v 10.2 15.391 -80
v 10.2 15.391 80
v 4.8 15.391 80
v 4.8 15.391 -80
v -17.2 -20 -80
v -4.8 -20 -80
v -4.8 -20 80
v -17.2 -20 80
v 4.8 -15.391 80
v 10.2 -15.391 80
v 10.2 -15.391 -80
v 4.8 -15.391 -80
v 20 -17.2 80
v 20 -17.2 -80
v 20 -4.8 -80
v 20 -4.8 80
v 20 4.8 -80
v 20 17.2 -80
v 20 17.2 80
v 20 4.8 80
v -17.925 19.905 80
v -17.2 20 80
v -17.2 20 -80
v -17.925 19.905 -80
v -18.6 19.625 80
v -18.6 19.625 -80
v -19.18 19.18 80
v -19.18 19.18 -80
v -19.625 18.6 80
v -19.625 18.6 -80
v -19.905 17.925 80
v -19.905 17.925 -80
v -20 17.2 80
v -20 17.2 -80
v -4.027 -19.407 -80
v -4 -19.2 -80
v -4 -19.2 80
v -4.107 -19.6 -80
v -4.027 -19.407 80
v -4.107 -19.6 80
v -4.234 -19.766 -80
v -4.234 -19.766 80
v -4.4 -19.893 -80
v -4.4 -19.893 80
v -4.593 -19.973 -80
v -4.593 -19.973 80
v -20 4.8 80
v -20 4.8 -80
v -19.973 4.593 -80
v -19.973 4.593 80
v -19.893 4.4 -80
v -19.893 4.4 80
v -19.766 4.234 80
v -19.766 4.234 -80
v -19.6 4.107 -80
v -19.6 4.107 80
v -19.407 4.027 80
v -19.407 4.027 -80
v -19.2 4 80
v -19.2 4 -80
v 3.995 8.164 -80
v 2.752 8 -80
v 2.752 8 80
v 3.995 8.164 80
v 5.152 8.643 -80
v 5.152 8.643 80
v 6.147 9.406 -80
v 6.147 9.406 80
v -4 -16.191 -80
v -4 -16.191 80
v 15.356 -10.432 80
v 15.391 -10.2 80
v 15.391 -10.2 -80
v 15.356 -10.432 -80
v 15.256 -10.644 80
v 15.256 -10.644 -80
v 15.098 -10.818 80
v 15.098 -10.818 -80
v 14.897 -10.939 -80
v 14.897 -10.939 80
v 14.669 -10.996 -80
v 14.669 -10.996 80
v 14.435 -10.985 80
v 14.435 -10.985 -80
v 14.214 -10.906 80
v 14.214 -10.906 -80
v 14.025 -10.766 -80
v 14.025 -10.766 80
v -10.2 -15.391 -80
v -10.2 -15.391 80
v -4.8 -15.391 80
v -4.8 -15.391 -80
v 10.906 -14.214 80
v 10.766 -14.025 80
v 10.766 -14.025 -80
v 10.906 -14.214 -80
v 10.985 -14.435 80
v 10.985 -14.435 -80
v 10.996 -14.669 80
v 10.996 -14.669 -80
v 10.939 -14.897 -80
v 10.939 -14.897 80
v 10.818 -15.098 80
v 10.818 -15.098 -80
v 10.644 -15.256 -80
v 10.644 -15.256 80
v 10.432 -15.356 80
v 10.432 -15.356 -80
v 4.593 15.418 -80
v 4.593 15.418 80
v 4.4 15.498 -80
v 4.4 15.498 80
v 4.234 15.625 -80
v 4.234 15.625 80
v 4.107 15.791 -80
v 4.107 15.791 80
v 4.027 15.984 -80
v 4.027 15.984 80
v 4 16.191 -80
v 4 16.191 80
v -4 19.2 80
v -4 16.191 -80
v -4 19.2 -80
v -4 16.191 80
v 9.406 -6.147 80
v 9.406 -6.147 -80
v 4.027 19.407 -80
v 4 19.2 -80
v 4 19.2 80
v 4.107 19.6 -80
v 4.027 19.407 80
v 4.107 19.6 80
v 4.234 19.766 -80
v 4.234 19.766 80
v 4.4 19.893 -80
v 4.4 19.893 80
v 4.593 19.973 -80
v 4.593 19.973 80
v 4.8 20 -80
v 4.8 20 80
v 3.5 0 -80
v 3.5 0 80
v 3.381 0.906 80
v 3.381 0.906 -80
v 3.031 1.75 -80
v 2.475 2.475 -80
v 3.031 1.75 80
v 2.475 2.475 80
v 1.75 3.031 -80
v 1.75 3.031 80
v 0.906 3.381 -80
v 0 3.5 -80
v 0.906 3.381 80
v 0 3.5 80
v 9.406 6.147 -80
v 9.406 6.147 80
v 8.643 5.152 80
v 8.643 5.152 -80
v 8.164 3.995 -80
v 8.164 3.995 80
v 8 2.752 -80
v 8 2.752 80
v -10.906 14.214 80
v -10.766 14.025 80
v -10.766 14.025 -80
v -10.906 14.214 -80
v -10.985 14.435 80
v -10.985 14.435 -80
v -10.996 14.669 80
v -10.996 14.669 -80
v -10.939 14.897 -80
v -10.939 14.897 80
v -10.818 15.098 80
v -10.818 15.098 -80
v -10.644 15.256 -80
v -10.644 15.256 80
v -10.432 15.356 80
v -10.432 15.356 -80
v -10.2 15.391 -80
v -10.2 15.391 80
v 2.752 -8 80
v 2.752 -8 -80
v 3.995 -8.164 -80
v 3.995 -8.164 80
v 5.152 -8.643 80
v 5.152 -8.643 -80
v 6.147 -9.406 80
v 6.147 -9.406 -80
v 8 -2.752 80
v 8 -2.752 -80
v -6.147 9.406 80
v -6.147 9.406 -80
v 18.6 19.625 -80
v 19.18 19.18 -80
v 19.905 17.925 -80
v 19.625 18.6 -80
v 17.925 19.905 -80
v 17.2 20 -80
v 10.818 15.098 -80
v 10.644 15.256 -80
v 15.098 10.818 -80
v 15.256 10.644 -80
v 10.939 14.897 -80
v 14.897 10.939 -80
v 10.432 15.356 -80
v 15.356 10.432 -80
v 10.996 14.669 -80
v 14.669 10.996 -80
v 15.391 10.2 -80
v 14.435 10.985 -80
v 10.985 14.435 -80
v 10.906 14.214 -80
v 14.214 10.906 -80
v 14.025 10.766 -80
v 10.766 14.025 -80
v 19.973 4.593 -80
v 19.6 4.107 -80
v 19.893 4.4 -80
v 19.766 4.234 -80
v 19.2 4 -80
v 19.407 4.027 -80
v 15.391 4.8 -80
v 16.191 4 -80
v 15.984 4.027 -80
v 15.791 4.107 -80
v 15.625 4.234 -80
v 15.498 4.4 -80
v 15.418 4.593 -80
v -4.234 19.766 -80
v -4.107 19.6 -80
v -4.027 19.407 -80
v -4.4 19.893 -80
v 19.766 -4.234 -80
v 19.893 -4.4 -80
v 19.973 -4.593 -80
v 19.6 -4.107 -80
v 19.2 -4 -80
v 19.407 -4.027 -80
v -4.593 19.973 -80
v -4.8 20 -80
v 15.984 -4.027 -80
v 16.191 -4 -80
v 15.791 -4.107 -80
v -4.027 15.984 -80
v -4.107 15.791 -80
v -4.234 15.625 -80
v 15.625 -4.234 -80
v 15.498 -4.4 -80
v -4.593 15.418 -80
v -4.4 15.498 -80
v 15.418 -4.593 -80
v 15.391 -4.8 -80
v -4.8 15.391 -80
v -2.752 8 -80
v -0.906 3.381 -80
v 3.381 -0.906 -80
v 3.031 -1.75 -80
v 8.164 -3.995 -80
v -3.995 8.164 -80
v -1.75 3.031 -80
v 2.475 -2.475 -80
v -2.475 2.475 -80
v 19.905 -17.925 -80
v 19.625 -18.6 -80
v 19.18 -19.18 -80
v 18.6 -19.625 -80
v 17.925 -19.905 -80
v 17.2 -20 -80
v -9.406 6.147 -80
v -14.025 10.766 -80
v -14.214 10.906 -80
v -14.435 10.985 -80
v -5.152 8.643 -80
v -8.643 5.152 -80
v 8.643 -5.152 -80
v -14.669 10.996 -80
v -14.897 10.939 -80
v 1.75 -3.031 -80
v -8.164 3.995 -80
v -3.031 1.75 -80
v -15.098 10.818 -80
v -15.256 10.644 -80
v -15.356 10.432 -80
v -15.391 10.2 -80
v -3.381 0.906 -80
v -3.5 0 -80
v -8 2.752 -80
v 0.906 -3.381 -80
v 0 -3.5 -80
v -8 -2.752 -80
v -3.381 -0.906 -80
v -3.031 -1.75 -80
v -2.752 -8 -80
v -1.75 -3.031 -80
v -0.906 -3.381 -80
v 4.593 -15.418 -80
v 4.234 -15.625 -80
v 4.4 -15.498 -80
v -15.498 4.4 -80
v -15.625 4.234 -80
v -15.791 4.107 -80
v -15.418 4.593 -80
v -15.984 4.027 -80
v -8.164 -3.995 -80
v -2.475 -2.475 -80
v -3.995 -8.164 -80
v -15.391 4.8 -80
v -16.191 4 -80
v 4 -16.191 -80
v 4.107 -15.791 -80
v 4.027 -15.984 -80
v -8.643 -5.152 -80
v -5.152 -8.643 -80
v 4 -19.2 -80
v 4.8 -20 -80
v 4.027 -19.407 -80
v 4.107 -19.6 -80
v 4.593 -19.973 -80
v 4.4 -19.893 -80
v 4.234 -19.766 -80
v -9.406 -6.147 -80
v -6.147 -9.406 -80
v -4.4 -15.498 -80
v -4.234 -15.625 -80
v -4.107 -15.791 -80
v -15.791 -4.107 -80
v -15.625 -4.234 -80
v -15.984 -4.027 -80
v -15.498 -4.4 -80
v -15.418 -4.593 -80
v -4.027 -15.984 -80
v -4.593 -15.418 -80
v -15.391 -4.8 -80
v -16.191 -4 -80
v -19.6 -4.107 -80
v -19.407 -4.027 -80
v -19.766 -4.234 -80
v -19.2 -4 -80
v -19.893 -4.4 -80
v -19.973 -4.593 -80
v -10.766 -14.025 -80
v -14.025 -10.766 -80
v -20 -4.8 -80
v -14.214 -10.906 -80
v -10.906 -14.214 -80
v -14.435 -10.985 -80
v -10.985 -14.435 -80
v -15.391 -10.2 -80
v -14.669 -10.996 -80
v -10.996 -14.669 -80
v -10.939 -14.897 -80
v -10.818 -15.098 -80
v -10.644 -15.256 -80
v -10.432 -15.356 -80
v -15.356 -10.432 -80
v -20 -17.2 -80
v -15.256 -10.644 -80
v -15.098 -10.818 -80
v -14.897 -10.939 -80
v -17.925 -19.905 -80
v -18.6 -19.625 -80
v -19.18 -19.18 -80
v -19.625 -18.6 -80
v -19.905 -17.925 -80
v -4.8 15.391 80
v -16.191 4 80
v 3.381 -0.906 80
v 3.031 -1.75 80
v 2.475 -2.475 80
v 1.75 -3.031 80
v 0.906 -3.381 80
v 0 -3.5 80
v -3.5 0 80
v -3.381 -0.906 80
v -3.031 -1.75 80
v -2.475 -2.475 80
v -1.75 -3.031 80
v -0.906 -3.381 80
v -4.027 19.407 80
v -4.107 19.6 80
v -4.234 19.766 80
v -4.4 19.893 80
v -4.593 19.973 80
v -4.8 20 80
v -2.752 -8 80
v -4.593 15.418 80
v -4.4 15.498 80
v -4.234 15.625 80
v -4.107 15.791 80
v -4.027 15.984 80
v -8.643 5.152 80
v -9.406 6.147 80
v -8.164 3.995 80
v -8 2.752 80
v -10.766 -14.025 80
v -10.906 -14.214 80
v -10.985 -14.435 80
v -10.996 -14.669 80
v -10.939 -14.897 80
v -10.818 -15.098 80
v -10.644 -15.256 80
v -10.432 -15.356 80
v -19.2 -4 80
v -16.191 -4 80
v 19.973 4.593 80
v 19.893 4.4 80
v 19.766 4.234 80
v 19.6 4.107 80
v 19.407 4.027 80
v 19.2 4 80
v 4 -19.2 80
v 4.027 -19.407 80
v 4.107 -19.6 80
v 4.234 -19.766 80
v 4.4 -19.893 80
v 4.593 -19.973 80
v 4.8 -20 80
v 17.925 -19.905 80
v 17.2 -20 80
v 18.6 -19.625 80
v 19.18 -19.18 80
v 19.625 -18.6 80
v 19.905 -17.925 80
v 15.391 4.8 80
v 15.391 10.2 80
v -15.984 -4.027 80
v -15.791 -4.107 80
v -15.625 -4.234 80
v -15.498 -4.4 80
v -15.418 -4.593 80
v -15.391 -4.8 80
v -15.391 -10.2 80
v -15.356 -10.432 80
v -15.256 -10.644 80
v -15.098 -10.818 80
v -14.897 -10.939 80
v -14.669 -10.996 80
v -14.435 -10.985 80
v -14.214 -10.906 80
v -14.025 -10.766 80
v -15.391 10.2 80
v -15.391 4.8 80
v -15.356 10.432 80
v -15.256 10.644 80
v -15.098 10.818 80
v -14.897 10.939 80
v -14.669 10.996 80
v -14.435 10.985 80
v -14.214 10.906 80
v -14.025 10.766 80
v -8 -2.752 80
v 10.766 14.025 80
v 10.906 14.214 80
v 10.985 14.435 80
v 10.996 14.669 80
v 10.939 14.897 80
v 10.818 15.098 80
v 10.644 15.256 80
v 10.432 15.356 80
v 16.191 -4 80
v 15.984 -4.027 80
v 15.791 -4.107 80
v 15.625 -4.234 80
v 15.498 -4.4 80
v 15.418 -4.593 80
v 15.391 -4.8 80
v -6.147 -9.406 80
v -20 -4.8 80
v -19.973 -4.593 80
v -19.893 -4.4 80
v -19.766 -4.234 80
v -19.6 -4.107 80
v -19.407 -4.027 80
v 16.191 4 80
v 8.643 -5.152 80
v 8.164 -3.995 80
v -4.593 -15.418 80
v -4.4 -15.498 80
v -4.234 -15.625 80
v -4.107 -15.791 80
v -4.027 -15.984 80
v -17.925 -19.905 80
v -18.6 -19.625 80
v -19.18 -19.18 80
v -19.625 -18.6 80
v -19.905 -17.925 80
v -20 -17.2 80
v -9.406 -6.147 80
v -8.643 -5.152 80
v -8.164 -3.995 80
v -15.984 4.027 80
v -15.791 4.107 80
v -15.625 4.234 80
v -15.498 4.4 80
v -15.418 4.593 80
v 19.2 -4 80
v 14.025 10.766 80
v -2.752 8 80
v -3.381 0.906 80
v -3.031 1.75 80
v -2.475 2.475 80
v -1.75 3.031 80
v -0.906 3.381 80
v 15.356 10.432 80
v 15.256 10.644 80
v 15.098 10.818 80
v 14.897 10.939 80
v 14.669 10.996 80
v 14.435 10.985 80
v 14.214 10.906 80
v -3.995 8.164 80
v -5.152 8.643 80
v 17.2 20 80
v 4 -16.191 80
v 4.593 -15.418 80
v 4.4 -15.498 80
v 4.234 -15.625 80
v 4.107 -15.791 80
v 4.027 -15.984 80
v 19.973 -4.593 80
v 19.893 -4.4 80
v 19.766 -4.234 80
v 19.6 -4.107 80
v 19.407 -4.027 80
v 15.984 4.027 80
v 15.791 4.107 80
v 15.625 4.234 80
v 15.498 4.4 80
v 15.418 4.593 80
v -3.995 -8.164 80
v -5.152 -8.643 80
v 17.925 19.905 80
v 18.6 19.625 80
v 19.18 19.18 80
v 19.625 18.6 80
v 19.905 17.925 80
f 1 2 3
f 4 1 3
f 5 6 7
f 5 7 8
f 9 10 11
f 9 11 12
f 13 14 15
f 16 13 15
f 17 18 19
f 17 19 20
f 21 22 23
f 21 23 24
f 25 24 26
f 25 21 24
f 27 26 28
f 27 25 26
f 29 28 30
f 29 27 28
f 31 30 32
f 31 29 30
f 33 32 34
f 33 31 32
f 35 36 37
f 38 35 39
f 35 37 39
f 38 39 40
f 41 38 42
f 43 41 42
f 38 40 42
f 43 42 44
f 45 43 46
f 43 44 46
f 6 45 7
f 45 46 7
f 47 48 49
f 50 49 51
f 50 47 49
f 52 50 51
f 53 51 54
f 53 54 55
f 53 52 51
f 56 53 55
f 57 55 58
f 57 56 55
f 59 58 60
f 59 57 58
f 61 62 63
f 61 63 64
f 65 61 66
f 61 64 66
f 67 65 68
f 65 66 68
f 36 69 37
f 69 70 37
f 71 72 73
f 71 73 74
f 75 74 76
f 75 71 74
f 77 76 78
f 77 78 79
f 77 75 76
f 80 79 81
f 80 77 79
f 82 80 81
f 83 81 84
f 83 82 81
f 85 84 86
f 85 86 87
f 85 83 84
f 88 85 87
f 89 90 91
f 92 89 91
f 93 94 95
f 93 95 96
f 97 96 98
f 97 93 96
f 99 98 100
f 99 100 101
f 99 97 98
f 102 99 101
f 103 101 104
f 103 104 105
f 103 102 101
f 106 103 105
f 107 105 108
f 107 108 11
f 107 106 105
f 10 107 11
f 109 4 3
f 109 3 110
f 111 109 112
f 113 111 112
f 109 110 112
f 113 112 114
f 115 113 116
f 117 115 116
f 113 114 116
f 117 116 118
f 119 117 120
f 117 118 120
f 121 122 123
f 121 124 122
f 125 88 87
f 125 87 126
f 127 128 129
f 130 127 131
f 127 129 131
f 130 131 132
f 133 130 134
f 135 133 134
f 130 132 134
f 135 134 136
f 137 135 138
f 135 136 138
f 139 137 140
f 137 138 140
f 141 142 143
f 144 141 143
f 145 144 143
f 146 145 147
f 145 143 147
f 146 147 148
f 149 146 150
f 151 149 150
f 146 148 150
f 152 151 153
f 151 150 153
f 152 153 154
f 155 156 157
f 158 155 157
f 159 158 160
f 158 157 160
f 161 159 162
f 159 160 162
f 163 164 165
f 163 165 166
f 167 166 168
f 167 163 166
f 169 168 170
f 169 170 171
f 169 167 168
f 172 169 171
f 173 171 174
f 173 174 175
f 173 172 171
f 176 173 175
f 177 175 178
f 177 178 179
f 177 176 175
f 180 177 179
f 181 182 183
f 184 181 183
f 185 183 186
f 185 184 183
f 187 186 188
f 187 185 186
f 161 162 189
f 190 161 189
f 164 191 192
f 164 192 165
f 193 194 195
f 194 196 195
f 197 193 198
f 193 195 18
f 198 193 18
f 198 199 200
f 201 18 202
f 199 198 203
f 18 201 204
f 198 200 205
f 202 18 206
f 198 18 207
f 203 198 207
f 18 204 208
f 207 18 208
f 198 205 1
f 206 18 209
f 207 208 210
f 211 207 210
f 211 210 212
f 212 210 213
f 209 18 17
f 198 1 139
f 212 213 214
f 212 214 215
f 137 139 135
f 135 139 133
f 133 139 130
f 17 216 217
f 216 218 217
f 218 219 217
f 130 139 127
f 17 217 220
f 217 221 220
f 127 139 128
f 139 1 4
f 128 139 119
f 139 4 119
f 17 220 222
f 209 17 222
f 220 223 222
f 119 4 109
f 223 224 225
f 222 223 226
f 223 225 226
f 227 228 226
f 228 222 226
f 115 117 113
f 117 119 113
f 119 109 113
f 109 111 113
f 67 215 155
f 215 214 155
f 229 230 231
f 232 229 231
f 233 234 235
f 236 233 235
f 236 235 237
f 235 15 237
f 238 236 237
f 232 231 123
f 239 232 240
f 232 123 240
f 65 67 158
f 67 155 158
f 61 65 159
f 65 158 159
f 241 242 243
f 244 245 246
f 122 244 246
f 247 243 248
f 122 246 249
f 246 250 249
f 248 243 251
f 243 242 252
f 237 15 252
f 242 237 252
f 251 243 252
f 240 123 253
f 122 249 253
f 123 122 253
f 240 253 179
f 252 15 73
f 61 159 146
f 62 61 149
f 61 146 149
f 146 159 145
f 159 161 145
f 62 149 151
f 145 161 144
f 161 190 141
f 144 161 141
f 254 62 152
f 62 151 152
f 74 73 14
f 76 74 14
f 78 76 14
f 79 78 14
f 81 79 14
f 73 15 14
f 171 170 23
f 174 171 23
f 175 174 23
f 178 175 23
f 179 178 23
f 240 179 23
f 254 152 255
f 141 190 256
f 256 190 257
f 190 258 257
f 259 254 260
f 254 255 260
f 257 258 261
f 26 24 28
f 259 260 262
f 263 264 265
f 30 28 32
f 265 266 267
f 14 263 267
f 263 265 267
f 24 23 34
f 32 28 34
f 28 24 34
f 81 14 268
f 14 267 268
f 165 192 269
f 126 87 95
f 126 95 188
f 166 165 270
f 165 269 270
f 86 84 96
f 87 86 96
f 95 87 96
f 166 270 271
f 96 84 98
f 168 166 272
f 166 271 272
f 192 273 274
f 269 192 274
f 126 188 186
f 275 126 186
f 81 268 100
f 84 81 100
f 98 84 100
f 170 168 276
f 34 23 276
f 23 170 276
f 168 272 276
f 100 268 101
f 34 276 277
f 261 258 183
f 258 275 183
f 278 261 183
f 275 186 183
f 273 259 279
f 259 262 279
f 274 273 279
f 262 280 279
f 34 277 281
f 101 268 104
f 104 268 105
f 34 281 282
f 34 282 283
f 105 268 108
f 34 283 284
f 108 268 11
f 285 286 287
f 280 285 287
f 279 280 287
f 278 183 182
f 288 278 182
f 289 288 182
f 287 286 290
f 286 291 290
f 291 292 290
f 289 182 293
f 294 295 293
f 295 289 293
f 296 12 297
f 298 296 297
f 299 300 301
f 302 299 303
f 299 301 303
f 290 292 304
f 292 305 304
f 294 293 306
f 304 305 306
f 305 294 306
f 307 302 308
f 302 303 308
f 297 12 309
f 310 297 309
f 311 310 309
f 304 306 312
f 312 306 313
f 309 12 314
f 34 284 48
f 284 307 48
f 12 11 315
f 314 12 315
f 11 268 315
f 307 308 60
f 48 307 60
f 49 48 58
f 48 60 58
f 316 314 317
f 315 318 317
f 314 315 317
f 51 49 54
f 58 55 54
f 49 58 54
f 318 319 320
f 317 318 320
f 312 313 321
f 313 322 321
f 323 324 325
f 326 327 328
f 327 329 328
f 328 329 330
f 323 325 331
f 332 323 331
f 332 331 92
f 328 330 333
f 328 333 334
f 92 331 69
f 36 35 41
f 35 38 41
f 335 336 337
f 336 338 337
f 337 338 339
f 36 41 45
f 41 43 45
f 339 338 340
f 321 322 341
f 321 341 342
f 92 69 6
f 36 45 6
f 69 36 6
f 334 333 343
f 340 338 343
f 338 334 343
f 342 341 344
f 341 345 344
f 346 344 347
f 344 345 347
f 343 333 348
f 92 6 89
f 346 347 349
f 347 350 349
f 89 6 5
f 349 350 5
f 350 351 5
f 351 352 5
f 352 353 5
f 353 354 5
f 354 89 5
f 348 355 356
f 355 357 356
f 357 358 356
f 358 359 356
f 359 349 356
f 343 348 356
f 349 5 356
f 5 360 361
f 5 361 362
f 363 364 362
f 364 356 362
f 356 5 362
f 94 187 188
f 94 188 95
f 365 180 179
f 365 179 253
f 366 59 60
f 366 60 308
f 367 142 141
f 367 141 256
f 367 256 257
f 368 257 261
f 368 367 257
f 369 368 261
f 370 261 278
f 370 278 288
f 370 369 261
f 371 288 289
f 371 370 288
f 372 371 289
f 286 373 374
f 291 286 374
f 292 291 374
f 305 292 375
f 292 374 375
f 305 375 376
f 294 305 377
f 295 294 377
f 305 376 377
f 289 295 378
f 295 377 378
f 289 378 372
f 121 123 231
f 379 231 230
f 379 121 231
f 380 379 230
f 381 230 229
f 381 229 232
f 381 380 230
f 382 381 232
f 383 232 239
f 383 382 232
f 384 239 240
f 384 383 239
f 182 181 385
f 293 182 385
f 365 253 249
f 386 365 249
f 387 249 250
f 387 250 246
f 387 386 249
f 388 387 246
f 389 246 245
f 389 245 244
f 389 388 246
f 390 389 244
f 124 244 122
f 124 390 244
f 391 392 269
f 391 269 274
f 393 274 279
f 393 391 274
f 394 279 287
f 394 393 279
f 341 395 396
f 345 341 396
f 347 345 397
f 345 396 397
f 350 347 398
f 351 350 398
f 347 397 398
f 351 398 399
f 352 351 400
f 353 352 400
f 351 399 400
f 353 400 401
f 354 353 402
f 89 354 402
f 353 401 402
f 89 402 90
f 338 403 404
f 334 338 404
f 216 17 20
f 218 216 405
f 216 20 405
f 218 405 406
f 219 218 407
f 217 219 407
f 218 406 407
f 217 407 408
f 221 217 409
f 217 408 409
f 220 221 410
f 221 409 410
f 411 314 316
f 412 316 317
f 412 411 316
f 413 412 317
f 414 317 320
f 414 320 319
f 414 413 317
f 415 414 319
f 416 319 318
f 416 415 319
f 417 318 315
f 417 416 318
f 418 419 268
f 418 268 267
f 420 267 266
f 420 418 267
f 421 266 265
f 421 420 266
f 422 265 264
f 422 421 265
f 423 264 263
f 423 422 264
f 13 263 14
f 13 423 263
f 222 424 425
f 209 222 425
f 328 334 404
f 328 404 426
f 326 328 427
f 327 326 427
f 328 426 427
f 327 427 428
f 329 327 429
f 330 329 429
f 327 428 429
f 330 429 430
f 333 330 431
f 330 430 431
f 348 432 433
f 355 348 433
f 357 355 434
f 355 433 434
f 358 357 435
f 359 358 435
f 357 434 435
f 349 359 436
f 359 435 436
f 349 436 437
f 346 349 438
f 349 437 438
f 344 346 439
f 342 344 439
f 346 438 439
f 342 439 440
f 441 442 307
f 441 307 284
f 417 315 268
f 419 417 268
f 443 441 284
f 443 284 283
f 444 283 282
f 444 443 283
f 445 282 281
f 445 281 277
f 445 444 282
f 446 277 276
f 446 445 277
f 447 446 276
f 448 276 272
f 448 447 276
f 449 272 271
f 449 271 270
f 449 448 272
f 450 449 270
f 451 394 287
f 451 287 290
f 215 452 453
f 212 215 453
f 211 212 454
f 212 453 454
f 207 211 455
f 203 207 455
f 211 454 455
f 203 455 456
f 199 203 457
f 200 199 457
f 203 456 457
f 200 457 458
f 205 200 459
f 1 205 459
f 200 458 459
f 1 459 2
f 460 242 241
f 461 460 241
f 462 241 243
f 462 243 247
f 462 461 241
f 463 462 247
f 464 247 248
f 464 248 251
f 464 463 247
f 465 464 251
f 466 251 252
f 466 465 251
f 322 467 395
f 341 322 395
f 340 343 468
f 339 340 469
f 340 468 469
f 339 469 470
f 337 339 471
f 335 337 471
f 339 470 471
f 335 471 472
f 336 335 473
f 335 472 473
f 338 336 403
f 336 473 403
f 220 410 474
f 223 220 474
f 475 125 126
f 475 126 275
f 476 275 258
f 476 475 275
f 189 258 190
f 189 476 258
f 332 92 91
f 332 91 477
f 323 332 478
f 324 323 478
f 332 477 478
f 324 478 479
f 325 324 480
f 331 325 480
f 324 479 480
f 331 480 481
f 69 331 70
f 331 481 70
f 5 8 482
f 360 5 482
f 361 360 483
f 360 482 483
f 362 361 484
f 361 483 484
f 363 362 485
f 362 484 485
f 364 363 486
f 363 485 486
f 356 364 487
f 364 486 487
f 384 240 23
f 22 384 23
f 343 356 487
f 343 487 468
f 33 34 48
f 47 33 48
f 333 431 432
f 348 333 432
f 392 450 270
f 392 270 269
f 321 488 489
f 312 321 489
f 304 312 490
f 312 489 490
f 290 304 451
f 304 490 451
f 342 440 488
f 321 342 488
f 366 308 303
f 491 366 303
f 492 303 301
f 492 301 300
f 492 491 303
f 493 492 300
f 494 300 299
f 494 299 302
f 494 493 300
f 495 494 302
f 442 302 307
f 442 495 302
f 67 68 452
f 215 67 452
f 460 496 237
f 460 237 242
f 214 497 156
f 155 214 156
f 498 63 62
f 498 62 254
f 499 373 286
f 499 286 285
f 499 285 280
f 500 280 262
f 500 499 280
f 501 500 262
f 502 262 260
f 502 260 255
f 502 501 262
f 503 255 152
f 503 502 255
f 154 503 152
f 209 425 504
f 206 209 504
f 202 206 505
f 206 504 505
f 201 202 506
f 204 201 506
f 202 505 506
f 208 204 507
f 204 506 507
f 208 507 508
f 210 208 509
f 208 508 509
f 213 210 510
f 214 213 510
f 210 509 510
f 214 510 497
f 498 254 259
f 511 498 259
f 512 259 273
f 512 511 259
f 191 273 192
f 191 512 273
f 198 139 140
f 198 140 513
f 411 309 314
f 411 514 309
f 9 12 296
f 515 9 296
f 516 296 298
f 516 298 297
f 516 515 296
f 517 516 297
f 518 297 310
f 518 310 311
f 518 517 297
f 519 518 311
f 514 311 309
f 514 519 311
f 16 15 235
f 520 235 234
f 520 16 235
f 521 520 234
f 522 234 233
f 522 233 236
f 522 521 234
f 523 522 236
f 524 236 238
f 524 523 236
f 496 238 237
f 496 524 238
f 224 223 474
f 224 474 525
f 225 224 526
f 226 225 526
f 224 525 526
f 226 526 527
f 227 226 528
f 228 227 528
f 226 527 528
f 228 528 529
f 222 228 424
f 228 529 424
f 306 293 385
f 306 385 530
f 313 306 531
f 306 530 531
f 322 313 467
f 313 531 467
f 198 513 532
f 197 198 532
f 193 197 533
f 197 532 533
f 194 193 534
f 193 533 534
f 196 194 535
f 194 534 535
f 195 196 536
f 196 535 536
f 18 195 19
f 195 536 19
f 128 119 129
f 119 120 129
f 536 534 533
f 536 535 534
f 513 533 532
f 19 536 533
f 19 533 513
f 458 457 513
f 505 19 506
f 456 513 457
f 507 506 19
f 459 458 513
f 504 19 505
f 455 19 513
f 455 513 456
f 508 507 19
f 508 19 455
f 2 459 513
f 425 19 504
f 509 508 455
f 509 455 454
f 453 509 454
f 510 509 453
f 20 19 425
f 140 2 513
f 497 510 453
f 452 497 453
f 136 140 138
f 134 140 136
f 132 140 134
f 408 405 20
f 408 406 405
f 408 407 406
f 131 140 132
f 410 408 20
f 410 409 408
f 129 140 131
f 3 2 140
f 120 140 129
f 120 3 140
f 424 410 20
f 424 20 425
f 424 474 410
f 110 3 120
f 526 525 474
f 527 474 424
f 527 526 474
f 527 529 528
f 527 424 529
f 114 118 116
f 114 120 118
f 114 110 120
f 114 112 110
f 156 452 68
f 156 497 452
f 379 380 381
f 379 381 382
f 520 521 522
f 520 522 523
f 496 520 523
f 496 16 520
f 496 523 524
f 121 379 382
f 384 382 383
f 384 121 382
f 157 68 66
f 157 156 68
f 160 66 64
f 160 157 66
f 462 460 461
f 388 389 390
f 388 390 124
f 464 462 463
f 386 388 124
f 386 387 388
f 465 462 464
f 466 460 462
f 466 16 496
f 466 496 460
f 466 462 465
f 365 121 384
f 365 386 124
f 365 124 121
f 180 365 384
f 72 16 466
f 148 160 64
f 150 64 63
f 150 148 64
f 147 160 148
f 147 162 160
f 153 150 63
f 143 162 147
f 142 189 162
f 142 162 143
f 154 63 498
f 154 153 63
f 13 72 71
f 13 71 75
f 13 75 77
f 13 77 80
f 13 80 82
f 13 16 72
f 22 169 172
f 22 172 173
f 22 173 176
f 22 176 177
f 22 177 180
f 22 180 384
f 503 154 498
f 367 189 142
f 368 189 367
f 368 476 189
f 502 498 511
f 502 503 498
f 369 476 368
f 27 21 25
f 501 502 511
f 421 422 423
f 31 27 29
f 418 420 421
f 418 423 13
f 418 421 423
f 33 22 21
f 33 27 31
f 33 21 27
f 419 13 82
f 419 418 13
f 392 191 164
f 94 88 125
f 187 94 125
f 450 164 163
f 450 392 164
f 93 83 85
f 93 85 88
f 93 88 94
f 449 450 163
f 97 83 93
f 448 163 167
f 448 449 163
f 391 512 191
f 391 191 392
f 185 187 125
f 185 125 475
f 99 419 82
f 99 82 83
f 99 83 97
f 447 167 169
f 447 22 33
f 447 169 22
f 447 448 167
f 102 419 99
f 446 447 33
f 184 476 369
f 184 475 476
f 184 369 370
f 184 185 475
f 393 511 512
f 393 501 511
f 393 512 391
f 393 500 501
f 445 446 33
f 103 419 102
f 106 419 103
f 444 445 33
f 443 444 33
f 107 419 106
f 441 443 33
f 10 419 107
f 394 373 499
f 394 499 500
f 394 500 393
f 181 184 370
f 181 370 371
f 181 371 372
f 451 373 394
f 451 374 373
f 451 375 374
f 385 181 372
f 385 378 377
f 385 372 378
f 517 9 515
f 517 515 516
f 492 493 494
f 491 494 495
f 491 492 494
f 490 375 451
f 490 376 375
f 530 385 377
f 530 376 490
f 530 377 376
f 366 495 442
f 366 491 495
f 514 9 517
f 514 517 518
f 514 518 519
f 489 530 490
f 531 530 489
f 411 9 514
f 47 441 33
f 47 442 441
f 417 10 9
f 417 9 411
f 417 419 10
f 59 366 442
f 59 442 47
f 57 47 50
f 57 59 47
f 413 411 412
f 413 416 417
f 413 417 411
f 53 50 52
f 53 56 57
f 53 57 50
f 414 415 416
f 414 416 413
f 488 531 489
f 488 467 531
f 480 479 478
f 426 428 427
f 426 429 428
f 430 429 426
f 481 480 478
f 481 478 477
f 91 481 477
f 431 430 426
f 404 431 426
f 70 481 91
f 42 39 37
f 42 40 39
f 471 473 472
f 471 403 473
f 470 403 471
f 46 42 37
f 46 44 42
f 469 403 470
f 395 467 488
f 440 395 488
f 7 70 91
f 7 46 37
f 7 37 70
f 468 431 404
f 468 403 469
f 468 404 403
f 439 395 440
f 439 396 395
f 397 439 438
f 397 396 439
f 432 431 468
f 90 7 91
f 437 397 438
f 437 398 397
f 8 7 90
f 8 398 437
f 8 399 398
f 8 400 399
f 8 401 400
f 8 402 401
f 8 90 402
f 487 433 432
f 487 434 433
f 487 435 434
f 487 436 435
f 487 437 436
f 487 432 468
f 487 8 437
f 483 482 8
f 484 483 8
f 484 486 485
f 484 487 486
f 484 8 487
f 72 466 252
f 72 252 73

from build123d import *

# Parameters (mm, degrees)
BOSS_EXTRUDE1_DEPTH = 80


with BuildPart() as part:
    # Sketch4 → Boss-Extrude1 (new body, symmetric)
    with BuildSketch(Plane.XY):
        with BuildLine():
            Line((4.8, -20), (17.2, -20))
            ThreePointArc((17.2, -20), (19.179898987, -19.179898987), (20, -17.2))
            Line((20, -17.2), (20, -4.8))
            ThreePointArc((20, -4.8), (19.765685425, -4.234314575), (19.2, -4))
            Line((19.2, -4), (16.190663761, -4))
            ThreePointArc((16.190663761, -4), (15.624978336, -4.234314575), (15.390663761, -4.8))
            Line((15.390663761, -4.8), (15.390663761, -10.2))
            ThreePointArc((15.390663761, -10.2), (14.896810507, -10.939103626), (14.024978336, -10.765685425))
            Line((14.024978336, -10.765685425), (9.40588745, -6.146594539))
            ThreePointArc((9.40588745, -6.146594539), (8.365378244, -4.589362465), (8, -2.752481989))
            Line((8, -2.752481989), (8, 0))
            Line((8, 0), (3.5, 0))
            ThreePointArc((3.5, 0), (2.474873734, -2.474873734), (0, -3.5))
            Line((0, -3.5), (0, -8))
            Line((0, -8), (2.752481989, -8))
            ThreePointArc((2.752481989, -8), (4.589362465, -8.365378244), (6.146594539, -9.40588745))
            Line((6.146594539, -9.40588745), (10.765685425, -14.024978336))
            ThreePointArc((10.765685425, -14.024978336), (10.939103626, -14.896810507), (10.2, -15.390663761))
            Line((10.2, -15.390663761), (4.8, -15.390663761))
            ThreePointArc((4.8, -15.390663761), (4.234314575, -15.624978336), (4, -16.190663761))
            Line((4, -16.190663761), (4, -19.2))
            ThreePointArc((4, -19.2), (4.234314575, -19.765685425), (4.8, -20))
        make_face()
    extrude(amount=BOSS_EXTRUDE1_DEPTH, both=True)

    # Mirror1: part across plane


with BuildPart() as part_1:
    add(part.part)
    add(part.part.mirror(Plane(origin=(0, 0, 0), x_dir=(0, 0, 1), z_dir=(1, 0, 0))))

    # Mirror2: part across plane


with BuildPart() as part_2:
    add(part_1.part)
    add(part_1.part.mirror(Plane.ZX))


solid = part_2.part
